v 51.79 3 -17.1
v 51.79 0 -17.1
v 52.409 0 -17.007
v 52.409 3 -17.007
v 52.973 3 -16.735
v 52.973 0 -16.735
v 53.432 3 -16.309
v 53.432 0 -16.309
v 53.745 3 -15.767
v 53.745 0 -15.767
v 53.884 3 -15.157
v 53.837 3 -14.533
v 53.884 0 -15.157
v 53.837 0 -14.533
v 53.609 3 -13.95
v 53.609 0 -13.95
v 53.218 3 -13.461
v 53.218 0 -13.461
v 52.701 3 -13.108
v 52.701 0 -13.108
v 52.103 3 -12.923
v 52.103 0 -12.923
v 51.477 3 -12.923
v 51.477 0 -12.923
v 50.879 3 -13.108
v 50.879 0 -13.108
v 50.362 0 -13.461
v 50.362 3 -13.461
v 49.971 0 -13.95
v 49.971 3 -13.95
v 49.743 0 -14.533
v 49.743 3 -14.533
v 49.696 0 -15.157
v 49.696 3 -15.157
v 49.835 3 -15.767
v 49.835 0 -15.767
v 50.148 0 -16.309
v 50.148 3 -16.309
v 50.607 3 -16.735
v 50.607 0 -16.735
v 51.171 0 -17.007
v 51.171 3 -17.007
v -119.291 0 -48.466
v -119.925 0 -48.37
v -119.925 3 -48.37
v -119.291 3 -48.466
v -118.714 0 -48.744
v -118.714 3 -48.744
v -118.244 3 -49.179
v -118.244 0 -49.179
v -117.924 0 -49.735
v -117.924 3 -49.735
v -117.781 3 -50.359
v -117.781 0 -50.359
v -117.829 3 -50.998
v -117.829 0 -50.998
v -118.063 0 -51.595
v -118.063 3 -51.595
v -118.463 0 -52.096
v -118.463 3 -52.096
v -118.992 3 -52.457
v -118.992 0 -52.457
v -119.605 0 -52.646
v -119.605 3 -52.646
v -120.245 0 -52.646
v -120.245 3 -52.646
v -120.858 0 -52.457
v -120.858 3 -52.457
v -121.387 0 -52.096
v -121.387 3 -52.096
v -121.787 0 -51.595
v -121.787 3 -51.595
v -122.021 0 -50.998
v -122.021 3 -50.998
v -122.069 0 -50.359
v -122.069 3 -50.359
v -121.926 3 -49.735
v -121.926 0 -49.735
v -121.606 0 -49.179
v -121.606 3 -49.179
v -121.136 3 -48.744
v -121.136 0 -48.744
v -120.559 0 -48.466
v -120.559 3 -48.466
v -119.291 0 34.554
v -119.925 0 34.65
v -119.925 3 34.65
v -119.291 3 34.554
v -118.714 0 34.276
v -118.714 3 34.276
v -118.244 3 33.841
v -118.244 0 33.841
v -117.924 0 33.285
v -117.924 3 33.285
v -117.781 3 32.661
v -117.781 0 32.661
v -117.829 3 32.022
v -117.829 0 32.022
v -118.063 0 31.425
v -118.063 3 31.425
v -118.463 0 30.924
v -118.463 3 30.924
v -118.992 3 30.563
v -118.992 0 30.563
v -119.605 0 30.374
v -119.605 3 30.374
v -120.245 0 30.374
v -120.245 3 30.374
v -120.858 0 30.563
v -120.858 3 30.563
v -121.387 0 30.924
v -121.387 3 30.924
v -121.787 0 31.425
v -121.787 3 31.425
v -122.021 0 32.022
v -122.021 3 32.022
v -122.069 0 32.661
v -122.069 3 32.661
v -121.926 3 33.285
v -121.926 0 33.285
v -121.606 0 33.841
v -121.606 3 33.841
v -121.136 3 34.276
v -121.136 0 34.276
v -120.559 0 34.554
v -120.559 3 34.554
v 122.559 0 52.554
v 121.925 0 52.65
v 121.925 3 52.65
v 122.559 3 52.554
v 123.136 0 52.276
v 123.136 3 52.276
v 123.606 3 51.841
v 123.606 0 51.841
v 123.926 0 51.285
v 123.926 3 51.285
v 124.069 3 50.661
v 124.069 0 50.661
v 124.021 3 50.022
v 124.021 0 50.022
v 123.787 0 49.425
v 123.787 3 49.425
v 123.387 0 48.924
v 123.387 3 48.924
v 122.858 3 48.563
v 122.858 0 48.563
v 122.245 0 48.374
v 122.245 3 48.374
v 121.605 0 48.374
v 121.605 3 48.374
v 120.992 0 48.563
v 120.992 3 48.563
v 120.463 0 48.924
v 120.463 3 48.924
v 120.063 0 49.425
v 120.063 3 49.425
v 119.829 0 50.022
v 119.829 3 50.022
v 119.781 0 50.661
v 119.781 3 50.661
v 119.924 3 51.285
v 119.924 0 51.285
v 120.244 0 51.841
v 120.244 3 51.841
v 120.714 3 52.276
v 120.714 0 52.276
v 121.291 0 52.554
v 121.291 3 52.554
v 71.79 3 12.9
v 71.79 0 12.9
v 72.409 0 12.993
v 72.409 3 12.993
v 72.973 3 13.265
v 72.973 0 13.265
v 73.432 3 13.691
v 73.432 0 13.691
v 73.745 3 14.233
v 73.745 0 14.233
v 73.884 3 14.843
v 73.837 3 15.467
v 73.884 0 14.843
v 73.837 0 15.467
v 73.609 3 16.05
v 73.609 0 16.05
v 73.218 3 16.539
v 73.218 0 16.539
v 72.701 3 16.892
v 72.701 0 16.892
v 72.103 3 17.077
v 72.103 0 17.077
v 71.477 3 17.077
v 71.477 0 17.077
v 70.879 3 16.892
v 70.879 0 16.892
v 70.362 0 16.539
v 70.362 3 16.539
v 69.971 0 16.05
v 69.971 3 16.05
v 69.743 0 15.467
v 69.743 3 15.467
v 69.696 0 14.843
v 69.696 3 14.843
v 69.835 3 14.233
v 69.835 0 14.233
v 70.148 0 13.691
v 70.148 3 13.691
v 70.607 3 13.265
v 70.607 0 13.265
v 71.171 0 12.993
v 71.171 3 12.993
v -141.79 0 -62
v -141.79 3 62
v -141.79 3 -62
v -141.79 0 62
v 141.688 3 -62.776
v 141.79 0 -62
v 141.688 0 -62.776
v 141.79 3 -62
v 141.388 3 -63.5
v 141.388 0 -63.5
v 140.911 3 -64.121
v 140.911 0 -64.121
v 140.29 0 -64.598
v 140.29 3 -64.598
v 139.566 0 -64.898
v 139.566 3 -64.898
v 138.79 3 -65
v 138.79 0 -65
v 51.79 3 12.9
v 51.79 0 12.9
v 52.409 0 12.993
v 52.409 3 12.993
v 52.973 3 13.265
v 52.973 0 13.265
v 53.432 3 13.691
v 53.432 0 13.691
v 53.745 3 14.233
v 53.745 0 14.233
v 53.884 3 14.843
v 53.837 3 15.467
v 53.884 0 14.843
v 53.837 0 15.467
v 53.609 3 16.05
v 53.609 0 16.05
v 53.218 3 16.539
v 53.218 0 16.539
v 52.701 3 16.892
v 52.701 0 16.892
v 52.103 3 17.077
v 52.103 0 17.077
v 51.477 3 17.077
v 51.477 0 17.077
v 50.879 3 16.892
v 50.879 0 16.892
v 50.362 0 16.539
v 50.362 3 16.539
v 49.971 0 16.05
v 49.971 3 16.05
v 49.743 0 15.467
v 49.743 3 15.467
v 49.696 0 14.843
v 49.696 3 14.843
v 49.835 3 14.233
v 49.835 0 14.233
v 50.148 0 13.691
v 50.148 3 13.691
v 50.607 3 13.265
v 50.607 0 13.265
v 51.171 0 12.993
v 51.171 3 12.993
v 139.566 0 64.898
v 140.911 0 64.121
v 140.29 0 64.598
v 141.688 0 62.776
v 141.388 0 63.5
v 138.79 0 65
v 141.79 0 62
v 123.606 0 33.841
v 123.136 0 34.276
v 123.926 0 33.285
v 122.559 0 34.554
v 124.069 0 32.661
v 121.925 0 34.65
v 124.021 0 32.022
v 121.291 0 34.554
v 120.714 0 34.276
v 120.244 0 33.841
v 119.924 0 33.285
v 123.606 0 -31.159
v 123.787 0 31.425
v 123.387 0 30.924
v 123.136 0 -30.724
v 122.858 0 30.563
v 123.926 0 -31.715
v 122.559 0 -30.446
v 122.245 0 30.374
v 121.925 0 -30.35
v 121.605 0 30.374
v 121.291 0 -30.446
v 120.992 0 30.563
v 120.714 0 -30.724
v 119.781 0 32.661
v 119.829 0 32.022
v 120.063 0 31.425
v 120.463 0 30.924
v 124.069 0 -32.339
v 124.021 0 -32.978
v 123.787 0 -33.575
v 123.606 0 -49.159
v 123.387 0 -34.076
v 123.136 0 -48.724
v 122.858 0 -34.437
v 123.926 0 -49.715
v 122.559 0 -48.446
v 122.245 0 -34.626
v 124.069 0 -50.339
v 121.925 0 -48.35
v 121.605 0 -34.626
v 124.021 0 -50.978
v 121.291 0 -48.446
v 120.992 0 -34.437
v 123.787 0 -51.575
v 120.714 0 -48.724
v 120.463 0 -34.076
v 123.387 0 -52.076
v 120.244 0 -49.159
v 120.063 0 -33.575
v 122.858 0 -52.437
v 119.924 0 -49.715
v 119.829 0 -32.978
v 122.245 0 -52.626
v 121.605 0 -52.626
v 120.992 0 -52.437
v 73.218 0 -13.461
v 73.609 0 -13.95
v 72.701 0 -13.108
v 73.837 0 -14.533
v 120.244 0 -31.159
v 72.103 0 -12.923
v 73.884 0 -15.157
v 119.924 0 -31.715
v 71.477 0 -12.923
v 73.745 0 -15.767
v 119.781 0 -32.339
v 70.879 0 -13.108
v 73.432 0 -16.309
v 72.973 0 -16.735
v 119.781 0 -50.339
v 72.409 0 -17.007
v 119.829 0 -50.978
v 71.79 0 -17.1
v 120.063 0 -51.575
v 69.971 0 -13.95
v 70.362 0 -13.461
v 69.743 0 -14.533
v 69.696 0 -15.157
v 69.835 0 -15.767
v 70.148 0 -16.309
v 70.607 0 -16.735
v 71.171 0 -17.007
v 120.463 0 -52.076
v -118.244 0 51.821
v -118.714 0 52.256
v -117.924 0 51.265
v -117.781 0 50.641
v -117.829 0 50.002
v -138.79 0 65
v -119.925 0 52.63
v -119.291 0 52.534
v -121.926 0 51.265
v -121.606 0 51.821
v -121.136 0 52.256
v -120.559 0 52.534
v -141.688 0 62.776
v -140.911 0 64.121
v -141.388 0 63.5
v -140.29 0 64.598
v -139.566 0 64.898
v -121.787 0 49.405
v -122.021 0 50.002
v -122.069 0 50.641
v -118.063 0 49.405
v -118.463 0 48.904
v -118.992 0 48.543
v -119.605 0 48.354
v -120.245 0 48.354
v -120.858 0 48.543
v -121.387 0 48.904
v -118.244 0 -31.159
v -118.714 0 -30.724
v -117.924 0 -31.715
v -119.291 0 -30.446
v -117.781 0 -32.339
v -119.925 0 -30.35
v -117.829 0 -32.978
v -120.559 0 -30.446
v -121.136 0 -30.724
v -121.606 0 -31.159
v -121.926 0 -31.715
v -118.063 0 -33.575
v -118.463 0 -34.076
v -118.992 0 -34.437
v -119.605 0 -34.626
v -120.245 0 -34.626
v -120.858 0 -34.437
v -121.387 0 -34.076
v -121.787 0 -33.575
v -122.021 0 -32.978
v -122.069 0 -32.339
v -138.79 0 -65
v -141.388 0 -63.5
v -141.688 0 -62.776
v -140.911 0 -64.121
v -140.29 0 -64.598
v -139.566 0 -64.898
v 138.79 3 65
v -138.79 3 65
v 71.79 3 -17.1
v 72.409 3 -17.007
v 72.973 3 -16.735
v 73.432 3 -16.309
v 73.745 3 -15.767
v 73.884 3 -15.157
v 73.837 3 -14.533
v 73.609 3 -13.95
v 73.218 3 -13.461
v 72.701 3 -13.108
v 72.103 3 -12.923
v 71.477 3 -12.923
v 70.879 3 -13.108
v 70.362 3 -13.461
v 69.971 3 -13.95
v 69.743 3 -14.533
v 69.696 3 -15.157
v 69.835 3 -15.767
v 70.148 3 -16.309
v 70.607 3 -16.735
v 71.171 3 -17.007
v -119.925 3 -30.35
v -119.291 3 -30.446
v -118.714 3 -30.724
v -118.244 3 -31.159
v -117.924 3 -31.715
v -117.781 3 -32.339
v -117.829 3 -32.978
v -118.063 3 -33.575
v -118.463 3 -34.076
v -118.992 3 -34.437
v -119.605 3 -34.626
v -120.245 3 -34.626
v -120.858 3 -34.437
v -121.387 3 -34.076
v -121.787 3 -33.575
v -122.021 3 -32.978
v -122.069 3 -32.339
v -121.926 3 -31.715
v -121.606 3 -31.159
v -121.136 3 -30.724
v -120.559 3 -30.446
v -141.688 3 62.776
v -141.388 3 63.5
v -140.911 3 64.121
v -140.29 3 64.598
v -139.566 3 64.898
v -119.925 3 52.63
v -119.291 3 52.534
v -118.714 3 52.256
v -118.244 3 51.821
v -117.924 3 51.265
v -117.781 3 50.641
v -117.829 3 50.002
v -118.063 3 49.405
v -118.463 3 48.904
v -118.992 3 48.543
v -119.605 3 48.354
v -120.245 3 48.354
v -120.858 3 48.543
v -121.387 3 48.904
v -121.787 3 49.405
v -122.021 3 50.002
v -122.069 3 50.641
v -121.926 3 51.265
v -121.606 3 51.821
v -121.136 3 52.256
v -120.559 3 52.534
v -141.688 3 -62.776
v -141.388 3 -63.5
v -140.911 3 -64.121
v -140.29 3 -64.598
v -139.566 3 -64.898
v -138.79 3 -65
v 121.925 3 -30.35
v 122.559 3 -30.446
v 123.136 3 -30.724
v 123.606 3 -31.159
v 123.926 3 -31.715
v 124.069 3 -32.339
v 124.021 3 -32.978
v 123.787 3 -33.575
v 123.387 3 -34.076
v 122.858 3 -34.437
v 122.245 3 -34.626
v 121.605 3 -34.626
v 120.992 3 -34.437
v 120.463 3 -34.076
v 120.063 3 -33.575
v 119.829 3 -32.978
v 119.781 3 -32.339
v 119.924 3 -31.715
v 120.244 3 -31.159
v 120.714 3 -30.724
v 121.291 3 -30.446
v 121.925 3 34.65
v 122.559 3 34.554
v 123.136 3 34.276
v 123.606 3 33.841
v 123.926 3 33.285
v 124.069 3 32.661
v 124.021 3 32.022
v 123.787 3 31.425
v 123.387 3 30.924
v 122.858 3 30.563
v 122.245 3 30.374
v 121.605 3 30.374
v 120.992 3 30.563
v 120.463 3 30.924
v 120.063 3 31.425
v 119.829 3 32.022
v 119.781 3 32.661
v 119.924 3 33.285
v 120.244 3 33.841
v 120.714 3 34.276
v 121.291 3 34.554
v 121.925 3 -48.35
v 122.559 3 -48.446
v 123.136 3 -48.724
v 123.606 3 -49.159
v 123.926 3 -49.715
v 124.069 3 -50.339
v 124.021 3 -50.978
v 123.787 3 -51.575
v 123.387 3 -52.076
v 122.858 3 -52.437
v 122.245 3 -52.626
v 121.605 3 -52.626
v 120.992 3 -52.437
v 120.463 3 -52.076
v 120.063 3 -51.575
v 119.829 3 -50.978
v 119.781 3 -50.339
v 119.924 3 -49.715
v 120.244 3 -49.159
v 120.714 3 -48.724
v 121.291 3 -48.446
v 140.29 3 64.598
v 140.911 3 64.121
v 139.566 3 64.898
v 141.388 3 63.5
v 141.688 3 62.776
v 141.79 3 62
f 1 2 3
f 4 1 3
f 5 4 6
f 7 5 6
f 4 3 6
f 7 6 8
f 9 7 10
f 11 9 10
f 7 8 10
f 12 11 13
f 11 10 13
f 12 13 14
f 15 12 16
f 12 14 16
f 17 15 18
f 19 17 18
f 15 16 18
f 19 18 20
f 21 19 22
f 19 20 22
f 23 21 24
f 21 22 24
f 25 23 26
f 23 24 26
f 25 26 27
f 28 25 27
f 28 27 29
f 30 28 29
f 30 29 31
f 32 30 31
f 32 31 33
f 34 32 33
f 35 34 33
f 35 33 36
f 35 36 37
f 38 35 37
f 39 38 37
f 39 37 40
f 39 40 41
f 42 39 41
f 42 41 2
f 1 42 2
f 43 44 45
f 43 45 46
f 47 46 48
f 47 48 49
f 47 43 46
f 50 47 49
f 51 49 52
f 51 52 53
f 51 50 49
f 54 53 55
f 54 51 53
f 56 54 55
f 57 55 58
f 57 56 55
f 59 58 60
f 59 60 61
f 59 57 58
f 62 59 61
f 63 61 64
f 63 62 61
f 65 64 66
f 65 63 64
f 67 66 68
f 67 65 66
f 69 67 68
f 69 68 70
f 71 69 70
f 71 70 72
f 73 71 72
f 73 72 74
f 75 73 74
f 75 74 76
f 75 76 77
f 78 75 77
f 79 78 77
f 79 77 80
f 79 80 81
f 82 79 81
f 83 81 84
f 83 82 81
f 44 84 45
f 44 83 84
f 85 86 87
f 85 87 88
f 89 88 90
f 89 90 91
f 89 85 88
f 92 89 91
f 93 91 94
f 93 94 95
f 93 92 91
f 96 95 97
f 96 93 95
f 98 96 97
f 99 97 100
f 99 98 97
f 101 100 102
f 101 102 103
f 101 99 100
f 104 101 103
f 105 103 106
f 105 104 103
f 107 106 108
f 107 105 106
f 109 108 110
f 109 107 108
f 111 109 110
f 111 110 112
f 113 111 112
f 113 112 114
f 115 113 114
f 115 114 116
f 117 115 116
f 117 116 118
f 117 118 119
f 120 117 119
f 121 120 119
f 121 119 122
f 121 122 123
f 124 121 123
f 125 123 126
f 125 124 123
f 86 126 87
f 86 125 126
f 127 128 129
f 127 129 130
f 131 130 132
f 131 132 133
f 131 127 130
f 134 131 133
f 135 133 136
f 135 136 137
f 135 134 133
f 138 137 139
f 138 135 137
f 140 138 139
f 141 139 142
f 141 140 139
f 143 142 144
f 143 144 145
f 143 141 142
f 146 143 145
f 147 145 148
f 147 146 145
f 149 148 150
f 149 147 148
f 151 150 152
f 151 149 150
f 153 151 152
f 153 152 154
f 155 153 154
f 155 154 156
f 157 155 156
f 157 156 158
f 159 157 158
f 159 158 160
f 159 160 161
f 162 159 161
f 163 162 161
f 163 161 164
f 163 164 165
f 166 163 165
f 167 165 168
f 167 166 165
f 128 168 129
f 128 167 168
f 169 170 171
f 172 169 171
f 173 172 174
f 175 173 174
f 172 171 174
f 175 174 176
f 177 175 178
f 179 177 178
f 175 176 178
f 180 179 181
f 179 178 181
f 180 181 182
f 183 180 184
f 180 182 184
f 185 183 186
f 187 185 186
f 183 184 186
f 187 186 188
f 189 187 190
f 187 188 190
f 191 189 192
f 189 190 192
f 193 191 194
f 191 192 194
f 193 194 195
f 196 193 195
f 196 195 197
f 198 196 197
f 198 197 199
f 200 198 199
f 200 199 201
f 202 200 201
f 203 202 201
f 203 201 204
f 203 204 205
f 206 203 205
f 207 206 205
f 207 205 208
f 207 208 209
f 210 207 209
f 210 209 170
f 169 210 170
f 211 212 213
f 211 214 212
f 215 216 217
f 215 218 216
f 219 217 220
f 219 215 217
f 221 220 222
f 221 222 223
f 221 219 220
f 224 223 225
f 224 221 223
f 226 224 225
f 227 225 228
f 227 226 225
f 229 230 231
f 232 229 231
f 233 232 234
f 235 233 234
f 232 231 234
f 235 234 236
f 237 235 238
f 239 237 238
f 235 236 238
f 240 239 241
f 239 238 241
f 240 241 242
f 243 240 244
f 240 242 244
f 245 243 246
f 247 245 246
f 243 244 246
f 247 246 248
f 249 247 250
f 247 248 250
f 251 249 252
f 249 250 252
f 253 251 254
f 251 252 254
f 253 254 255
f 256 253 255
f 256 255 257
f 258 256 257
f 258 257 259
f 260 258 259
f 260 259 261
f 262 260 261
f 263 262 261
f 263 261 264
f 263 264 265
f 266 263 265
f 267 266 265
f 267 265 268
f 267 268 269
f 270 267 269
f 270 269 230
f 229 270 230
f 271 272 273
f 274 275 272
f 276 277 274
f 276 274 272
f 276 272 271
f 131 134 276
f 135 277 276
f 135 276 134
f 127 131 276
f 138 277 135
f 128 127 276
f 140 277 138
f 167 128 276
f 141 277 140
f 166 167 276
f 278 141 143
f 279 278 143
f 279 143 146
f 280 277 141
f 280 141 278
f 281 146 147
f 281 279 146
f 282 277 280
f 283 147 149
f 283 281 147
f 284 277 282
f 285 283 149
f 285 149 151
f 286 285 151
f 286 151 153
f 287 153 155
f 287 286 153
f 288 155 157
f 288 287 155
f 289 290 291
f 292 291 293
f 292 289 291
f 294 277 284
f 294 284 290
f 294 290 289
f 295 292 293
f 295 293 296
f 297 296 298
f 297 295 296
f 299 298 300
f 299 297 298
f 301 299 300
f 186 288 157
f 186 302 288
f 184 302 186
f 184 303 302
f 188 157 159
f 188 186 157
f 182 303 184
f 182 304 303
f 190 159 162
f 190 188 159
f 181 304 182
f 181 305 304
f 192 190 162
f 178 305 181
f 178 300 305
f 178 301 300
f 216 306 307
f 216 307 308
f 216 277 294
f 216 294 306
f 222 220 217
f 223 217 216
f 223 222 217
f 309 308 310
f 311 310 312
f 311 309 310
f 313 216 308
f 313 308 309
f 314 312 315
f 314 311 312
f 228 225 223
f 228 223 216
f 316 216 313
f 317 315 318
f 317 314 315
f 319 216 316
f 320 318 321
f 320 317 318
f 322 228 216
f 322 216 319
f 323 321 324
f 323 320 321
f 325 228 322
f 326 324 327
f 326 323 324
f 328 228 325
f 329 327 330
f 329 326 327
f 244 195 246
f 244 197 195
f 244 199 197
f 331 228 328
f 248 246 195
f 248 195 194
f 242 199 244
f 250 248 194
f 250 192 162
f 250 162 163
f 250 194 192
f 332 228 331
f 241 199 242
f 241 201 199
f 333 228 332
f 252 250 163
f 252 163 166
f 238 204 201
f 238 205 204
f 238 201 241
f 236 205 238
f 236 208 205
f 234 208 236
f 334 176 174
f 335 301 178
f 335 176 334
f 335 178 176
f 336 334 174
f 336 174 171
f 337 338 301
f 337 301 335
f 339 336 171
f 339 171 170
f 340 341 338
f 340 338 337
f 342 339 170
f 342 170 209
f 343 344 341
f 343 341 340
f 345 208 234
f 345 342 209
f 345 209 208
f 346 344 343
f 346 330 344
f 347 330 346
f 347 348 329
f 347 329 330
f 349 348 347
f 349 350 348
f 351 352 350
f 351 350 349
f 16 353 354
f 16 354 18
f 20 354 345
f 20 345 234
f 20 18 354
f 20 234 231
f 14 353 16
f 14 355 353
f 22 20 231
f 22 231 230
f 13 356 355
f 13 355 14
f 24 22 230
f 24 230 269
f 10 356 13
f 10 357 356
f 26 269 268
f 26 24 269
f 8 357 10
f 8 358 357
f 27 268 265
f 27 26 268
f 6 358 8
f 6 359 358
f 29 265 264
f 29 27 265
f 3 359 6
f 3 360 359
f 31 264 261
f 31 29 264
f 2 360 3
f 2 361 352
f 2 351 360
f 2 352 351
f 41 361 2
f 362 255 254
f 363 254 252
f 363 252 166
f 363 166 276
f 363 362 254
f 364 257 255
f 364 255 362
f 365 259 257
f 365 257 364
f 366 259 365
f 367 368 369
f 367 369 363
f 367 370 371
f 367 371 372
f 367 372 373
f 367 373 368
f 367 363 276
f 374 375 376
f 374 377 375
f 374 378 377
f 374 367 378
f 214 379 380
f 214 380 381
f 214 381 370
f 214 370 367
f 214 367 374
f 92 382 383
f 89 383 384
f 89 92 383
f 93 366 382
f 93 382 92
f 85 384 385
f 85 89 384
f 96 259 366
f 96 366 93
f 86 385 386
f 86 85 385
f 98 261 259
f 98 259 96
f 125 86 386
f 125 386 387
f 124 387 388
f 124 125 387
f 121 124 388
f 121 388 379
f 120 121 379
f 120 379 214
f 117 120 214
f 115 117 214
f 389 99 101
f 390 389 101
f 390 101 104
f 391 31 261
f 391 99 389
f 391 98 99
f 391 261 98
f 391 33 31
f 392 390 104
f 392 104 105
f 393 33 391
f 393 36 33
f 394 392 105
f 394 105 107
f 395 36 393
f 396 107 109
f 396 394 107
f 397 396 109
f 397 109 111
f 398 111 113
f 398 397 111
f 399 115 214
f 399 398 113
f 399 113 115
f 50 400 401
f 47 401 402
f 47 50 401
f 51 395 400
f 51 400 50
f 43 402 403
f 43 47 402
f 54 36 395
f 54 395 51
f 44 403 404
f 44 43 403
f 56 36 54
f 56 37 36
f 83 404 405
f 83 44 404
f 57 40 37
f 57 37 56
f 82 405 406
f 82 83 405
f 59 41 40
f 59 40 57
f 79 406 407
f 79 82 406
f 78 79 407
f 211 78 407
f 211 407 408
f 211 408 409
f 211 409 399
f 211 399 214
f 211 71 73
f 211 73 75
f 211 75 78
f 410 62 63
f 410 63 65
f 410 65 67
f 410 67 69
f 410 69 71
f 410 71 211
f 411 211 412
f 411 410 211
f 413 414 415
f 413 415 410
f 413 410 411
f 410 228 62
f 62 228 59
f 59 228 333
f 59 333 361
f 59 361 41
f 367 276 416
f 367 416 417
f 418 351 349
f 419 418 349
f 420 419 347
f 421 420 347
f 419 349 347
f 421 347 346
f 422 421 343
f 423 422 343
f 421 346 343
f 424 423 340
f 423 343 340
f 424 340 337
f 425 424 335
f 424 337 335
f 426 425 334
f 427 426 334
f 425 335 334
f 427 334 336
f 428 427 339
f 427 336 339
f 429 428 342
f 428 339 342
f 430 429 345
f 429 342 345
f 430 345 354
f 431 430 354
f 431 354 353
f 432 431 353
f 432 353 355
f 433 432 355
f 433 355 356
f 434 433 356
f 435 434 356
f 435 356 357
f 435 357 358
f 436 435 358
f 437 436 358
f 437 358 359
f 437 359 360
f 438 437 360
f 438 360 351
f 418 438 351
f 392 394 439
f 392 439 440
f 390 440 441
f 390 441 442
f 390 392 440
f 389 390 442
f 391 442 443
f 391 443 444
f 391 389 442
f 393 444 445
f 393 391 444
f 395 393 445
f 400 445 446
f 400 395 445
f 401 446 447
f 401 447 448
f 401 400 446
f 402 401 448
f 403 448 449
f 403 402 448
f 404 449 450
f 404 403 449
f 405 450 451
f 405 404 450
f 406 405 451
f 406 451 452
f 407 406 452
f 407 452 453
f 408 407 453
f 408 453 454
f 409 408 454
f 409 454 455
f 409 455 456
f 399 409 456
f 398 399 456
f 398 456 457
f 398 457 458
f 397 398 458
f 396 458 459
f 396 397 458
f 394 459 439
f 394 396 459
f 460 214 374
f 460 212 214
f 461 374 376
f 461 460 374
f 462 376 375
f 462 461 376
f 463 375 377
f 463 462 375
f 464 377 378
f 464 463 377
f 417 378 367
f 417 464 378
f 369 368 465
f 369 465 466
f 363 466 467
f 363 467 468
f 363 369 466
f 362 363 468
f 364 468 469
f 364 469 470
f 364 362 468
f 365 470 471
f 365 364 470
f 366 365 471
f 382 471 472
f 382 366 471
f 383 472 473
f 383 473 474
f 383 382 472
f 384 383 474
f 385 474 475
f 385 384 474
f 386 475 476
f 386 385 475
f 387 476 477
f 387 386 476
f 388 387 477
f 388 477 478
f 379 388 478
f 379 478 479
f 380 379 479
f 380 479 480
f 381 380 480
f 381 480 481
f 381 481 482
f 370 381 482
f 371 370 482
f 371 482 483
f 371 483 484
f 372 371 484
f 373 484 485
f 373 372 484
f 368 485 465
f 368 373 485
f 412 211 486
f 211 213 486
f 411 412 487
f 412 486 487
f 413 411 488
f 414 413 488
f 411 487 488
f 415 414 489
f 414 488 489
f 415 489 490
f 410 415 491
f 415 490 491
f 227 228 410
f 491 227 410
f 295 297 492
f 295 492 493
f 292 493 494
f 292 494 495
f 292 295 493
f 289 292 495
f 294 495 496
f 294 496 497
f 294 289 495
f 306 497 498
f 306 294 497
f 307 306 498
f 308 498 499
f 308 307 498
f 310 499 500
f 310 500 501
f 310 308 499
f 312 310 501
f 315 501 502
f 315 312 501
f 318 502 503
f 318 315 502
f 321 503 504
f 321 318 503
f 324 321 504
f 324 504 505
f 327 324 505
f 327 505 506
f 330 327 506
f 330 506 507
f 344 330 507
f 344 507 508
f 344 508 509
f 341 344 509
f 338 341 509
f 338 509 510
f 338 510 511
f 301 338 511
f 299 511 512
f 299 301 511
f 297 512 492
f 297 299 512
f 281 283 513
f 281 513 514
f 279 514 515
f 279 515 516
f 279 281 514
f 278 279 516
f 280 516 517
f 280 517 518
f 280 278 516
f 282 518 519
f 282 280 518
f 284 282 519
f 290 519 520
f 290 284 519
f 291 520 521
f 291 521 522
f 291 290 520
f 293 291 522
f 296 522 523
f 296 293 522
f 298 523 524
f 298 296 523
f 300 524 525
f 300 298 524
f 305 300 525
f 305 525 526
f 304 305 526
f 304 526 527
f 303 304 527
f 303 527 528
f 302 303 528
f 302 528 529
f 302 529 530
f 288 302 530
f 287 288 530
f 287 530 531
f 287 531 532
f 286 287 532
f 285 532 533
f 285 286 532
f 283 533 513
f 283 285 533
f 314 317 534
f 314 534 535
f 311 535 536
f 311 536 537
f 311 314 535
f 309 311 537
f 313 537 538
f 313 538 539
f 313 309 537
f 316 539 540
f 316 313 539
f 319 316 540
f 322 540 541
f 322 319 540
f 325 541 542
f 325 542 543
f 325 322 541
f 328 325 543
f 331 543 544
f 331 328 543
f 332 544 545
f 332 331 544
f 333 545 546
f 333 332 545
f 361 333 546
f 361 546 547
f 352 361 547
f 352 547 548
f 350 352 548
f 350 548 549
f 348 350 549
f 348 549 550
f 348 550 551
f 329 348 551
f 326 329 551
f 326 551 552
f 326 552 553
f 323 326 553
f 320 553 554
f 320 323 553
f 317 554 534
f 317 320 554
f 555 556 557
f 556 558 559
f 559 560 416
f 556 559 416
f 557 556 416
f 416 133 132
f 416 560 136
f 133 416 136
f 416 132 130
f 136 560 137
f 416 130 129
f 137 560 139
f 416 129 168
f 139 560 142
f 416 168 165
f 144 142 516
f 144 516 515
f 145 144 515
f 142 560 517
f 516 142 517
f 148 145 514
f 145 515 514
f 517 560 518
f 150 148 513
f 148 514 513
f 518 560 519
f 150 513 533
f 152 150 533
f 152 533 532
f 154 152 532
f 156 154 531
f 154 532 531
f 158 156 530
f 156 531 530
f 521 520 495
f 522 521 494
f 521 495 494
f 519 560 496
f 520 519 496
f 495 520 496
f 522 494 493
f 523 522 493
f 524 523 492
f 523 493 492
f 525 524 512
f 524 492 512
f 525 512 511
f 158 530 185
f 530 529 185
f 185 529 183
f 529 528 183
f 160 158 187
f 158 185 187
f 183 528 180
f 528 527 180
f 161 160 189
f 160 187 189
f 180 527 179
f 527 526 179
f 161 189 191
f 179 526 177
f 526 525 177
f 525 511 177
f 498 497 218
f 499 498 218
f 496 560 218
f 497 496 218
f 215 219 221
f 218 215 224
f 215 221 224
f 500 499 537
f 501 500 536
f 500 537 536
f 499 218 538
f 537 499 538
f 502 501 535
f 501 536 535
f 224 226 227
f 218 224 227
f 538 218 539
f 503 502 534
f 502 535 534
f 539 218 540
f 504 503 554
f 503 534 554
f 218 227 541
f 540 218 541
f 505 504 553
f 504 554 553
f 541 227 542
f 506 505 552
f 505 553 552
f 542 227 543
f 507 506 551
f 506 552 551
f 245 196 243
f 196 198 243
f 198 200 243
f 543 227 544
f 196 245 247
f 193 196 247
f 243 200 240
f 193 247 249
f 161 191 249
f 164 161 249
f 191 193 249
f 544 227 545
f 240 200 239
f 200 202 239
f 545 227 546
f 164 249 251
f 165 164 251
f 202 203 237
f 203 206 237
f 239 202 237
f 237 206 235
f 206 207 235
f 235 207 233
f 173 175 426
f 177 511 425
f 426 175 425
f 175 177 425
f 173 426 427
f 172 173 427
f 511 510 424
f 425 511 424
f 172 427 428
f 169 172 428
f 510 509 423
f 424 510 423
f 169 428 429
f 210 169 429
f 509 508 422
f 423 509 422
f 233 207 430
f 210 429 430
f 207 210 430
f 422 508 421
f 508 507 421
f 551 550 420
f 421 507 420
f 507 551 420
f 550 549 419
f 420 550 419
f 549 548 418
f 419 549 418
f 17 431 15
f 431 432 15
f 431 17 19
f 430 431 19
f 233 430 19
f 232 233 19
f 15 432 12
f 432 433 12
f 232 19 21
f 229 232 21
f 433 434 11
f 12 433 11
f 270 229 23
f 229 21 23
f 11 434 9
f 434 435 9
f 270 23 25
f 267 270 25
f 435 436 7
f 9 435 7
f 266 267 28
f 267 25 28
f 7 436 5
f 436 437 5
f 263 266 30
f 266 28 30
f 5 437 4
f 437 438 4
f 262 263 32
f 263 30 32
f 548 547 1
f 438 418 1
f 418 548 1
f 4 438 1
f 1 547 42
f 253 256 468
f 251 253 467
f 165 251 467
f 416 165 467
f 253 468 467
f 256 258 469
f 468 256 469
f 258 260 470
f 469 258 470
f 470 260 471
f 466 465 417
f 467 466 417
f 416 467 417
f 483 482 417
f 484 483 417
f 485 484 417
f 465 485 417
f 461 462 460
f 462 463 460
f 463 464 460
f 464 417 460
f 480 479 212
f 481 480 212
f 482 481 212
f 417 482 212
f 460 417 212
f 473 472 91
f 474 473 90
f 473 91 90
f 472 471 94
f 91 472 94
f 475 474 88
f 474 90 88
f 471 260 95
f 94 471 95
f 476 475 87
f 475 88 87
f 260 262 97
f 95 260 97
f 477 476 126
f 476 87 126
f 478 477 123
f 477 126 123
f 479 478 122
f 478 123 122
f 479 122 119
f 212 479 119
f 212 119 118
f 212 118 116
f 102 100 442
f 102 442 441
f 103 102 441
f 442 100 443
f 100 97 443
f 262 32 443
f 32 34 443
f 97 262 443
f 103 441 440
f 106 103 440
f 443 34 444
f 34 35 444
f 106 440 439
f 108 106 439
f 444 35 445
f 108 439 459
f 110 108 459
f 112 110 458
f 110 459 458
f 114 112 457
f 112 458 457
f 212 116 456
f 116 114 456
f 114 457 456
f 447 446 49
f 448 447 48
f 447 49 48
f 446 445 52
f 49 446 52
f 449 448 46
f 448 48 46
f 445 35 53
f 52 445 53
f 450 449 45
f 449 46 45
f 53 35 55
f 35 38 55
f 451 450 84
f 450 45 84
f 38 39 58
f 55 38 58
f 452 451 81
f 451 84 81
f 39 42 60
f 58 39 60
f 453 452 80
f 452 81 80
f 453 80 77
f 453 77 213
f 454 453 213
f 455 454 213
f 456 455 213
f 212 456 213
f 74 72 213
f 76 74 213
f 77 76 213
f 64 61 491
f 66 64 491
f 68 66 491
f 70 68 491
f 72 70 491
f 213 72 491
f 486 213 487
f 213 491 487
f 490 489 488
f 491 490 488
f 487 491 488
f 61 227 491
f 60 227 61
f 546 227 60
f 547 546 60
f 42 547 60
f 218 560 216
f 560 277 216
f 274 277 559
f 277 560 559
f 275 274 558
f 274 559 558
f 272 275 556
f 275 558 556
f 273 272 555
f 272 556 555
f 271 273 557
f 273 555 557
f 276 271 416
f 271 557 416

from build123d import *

# Parameters (mm, degrees)
SKETCH_1_W          = 283.58
SKETCH_1_H          = 111
SKETCH_1_R          = 2.15
EXTRUDE_1_DEPTH     = 3
SKETCH_2_W          = 283.58
SKETCH_2_H          = 9.5
EXTRUDE_2_DEPTH     = 3
FILLET_1_R          = 3
SKETCH_3_R          = 2.1
CUT_EXTRUDE_1_DEPTH = 10


with BuildPart() as part:
    # 草图1 → 凸台-拉伸1 (new body)
    with BuildSketch(Plane(origin=(0, 0, 0), x_dir=(1, 0, 0), z_dir=(0, 1, 0))):
        Rectangle(SKETCH_1_W, SKETCH_1_H)
        with Locations(Location((121.925, 50.5, 0), (0, 0, 270))):
            Circle(SKETCH_1_R, mode=Mode.SUBTRACT)
        with Locations(Location((121.925, 32.5, 0), (0, 0, 270))):
            Circle(SKETCH_1_R, mode=Mode.SUBTRACT)
        with Locations(Location((121.925, -32.5, 0), (0, 0, 270))):
            Circle(SKETCH_1_R, mode=Mode.SUBTRACT)
        with Locations(Location((121.925, -50.5, 0), (0, 0, 270))):
            Circle(SKETCH_1_R, mode=Mode.SUBTRACT)
        with Locations(Location((-119.925, 50.52, 0), (0, 0, 270))):
            Circle(SKETCH_1_R, mode=Mode.SUBTRACT)
        with Locations(Location((-119.925, 32.5, 0), (0, 0, 270))):
            Circle(SKETCH_1_R, mode=Mode.SUBTRACT)
        with Locations(Location((-119.925, -32.5, 0), (0, 0, 270))):
            Circle(SKETCH_1_R, mode=Mode.SUBTRACT)
        with Locations(Location((-119.925, -50.48, 0), (0, 0, 270))):
            Circle(SKETCH_1_R, mode=Mode.SUBTRACT)
    extrude(amount=EXTRUDE_1_DEPTH)

    # 草图2 → 凸台-拉伸2 (add)
    with BuildSketch(Plane(origin=(0, 0, 0), x_dir=(-1, 0, 0), z_dir=(0, -1, 0))):
        with Locations((0, -60.25)):
            Rectangle(SKETCH_2_W, SKETCH_2_H)
        with Locations((0, 60.25)):
            Rectangle(SKETCH_2_W, SKETCH_2_H)
    extrude(amount=-EXTRUDE_2_DEPTH)

    # 圆角1
    fillet_1_edges = [part.edges().sort_by_distance(p)[0] for p in [
        (-141.79, 1.5, 65),
        (141.79, 1.5, 65),
        (-141.79, 1.5, -65),
        (141.79, 1.5, -65),
    ]]
    fillet(fillet_1_edges, radius=FILLET_1_R)

    # 草图3 → 切除-拉伸1 (cut)
    with BuildSketch(Plane(origin=(0, 0, 0), x_dir=(-1, 0, 0), z_dir=(0, -1, 0))):
        with Locations(Location((-71.79, -15, 0), (0, 0, 90))):
            Circle(SKETCH_3_R)
        with Locations(Location((-51.79, -15, 0), (0, 0, 90))):
            Circle(SKETCH_3_R)
        with Locations(Location((-51.79, 15, 0), (0, 0, 90))):
            Circle(SKETCH_3_R)
        with Locations(Location((-71.79, 15, 0), (0, 0, 90))):
            Circle(SKETCH_3_R)
    extrude(amount=-CUT_EXTRUDE_1_DEPTH, mode=Mode.SUBTRACT)


solid = part.part
